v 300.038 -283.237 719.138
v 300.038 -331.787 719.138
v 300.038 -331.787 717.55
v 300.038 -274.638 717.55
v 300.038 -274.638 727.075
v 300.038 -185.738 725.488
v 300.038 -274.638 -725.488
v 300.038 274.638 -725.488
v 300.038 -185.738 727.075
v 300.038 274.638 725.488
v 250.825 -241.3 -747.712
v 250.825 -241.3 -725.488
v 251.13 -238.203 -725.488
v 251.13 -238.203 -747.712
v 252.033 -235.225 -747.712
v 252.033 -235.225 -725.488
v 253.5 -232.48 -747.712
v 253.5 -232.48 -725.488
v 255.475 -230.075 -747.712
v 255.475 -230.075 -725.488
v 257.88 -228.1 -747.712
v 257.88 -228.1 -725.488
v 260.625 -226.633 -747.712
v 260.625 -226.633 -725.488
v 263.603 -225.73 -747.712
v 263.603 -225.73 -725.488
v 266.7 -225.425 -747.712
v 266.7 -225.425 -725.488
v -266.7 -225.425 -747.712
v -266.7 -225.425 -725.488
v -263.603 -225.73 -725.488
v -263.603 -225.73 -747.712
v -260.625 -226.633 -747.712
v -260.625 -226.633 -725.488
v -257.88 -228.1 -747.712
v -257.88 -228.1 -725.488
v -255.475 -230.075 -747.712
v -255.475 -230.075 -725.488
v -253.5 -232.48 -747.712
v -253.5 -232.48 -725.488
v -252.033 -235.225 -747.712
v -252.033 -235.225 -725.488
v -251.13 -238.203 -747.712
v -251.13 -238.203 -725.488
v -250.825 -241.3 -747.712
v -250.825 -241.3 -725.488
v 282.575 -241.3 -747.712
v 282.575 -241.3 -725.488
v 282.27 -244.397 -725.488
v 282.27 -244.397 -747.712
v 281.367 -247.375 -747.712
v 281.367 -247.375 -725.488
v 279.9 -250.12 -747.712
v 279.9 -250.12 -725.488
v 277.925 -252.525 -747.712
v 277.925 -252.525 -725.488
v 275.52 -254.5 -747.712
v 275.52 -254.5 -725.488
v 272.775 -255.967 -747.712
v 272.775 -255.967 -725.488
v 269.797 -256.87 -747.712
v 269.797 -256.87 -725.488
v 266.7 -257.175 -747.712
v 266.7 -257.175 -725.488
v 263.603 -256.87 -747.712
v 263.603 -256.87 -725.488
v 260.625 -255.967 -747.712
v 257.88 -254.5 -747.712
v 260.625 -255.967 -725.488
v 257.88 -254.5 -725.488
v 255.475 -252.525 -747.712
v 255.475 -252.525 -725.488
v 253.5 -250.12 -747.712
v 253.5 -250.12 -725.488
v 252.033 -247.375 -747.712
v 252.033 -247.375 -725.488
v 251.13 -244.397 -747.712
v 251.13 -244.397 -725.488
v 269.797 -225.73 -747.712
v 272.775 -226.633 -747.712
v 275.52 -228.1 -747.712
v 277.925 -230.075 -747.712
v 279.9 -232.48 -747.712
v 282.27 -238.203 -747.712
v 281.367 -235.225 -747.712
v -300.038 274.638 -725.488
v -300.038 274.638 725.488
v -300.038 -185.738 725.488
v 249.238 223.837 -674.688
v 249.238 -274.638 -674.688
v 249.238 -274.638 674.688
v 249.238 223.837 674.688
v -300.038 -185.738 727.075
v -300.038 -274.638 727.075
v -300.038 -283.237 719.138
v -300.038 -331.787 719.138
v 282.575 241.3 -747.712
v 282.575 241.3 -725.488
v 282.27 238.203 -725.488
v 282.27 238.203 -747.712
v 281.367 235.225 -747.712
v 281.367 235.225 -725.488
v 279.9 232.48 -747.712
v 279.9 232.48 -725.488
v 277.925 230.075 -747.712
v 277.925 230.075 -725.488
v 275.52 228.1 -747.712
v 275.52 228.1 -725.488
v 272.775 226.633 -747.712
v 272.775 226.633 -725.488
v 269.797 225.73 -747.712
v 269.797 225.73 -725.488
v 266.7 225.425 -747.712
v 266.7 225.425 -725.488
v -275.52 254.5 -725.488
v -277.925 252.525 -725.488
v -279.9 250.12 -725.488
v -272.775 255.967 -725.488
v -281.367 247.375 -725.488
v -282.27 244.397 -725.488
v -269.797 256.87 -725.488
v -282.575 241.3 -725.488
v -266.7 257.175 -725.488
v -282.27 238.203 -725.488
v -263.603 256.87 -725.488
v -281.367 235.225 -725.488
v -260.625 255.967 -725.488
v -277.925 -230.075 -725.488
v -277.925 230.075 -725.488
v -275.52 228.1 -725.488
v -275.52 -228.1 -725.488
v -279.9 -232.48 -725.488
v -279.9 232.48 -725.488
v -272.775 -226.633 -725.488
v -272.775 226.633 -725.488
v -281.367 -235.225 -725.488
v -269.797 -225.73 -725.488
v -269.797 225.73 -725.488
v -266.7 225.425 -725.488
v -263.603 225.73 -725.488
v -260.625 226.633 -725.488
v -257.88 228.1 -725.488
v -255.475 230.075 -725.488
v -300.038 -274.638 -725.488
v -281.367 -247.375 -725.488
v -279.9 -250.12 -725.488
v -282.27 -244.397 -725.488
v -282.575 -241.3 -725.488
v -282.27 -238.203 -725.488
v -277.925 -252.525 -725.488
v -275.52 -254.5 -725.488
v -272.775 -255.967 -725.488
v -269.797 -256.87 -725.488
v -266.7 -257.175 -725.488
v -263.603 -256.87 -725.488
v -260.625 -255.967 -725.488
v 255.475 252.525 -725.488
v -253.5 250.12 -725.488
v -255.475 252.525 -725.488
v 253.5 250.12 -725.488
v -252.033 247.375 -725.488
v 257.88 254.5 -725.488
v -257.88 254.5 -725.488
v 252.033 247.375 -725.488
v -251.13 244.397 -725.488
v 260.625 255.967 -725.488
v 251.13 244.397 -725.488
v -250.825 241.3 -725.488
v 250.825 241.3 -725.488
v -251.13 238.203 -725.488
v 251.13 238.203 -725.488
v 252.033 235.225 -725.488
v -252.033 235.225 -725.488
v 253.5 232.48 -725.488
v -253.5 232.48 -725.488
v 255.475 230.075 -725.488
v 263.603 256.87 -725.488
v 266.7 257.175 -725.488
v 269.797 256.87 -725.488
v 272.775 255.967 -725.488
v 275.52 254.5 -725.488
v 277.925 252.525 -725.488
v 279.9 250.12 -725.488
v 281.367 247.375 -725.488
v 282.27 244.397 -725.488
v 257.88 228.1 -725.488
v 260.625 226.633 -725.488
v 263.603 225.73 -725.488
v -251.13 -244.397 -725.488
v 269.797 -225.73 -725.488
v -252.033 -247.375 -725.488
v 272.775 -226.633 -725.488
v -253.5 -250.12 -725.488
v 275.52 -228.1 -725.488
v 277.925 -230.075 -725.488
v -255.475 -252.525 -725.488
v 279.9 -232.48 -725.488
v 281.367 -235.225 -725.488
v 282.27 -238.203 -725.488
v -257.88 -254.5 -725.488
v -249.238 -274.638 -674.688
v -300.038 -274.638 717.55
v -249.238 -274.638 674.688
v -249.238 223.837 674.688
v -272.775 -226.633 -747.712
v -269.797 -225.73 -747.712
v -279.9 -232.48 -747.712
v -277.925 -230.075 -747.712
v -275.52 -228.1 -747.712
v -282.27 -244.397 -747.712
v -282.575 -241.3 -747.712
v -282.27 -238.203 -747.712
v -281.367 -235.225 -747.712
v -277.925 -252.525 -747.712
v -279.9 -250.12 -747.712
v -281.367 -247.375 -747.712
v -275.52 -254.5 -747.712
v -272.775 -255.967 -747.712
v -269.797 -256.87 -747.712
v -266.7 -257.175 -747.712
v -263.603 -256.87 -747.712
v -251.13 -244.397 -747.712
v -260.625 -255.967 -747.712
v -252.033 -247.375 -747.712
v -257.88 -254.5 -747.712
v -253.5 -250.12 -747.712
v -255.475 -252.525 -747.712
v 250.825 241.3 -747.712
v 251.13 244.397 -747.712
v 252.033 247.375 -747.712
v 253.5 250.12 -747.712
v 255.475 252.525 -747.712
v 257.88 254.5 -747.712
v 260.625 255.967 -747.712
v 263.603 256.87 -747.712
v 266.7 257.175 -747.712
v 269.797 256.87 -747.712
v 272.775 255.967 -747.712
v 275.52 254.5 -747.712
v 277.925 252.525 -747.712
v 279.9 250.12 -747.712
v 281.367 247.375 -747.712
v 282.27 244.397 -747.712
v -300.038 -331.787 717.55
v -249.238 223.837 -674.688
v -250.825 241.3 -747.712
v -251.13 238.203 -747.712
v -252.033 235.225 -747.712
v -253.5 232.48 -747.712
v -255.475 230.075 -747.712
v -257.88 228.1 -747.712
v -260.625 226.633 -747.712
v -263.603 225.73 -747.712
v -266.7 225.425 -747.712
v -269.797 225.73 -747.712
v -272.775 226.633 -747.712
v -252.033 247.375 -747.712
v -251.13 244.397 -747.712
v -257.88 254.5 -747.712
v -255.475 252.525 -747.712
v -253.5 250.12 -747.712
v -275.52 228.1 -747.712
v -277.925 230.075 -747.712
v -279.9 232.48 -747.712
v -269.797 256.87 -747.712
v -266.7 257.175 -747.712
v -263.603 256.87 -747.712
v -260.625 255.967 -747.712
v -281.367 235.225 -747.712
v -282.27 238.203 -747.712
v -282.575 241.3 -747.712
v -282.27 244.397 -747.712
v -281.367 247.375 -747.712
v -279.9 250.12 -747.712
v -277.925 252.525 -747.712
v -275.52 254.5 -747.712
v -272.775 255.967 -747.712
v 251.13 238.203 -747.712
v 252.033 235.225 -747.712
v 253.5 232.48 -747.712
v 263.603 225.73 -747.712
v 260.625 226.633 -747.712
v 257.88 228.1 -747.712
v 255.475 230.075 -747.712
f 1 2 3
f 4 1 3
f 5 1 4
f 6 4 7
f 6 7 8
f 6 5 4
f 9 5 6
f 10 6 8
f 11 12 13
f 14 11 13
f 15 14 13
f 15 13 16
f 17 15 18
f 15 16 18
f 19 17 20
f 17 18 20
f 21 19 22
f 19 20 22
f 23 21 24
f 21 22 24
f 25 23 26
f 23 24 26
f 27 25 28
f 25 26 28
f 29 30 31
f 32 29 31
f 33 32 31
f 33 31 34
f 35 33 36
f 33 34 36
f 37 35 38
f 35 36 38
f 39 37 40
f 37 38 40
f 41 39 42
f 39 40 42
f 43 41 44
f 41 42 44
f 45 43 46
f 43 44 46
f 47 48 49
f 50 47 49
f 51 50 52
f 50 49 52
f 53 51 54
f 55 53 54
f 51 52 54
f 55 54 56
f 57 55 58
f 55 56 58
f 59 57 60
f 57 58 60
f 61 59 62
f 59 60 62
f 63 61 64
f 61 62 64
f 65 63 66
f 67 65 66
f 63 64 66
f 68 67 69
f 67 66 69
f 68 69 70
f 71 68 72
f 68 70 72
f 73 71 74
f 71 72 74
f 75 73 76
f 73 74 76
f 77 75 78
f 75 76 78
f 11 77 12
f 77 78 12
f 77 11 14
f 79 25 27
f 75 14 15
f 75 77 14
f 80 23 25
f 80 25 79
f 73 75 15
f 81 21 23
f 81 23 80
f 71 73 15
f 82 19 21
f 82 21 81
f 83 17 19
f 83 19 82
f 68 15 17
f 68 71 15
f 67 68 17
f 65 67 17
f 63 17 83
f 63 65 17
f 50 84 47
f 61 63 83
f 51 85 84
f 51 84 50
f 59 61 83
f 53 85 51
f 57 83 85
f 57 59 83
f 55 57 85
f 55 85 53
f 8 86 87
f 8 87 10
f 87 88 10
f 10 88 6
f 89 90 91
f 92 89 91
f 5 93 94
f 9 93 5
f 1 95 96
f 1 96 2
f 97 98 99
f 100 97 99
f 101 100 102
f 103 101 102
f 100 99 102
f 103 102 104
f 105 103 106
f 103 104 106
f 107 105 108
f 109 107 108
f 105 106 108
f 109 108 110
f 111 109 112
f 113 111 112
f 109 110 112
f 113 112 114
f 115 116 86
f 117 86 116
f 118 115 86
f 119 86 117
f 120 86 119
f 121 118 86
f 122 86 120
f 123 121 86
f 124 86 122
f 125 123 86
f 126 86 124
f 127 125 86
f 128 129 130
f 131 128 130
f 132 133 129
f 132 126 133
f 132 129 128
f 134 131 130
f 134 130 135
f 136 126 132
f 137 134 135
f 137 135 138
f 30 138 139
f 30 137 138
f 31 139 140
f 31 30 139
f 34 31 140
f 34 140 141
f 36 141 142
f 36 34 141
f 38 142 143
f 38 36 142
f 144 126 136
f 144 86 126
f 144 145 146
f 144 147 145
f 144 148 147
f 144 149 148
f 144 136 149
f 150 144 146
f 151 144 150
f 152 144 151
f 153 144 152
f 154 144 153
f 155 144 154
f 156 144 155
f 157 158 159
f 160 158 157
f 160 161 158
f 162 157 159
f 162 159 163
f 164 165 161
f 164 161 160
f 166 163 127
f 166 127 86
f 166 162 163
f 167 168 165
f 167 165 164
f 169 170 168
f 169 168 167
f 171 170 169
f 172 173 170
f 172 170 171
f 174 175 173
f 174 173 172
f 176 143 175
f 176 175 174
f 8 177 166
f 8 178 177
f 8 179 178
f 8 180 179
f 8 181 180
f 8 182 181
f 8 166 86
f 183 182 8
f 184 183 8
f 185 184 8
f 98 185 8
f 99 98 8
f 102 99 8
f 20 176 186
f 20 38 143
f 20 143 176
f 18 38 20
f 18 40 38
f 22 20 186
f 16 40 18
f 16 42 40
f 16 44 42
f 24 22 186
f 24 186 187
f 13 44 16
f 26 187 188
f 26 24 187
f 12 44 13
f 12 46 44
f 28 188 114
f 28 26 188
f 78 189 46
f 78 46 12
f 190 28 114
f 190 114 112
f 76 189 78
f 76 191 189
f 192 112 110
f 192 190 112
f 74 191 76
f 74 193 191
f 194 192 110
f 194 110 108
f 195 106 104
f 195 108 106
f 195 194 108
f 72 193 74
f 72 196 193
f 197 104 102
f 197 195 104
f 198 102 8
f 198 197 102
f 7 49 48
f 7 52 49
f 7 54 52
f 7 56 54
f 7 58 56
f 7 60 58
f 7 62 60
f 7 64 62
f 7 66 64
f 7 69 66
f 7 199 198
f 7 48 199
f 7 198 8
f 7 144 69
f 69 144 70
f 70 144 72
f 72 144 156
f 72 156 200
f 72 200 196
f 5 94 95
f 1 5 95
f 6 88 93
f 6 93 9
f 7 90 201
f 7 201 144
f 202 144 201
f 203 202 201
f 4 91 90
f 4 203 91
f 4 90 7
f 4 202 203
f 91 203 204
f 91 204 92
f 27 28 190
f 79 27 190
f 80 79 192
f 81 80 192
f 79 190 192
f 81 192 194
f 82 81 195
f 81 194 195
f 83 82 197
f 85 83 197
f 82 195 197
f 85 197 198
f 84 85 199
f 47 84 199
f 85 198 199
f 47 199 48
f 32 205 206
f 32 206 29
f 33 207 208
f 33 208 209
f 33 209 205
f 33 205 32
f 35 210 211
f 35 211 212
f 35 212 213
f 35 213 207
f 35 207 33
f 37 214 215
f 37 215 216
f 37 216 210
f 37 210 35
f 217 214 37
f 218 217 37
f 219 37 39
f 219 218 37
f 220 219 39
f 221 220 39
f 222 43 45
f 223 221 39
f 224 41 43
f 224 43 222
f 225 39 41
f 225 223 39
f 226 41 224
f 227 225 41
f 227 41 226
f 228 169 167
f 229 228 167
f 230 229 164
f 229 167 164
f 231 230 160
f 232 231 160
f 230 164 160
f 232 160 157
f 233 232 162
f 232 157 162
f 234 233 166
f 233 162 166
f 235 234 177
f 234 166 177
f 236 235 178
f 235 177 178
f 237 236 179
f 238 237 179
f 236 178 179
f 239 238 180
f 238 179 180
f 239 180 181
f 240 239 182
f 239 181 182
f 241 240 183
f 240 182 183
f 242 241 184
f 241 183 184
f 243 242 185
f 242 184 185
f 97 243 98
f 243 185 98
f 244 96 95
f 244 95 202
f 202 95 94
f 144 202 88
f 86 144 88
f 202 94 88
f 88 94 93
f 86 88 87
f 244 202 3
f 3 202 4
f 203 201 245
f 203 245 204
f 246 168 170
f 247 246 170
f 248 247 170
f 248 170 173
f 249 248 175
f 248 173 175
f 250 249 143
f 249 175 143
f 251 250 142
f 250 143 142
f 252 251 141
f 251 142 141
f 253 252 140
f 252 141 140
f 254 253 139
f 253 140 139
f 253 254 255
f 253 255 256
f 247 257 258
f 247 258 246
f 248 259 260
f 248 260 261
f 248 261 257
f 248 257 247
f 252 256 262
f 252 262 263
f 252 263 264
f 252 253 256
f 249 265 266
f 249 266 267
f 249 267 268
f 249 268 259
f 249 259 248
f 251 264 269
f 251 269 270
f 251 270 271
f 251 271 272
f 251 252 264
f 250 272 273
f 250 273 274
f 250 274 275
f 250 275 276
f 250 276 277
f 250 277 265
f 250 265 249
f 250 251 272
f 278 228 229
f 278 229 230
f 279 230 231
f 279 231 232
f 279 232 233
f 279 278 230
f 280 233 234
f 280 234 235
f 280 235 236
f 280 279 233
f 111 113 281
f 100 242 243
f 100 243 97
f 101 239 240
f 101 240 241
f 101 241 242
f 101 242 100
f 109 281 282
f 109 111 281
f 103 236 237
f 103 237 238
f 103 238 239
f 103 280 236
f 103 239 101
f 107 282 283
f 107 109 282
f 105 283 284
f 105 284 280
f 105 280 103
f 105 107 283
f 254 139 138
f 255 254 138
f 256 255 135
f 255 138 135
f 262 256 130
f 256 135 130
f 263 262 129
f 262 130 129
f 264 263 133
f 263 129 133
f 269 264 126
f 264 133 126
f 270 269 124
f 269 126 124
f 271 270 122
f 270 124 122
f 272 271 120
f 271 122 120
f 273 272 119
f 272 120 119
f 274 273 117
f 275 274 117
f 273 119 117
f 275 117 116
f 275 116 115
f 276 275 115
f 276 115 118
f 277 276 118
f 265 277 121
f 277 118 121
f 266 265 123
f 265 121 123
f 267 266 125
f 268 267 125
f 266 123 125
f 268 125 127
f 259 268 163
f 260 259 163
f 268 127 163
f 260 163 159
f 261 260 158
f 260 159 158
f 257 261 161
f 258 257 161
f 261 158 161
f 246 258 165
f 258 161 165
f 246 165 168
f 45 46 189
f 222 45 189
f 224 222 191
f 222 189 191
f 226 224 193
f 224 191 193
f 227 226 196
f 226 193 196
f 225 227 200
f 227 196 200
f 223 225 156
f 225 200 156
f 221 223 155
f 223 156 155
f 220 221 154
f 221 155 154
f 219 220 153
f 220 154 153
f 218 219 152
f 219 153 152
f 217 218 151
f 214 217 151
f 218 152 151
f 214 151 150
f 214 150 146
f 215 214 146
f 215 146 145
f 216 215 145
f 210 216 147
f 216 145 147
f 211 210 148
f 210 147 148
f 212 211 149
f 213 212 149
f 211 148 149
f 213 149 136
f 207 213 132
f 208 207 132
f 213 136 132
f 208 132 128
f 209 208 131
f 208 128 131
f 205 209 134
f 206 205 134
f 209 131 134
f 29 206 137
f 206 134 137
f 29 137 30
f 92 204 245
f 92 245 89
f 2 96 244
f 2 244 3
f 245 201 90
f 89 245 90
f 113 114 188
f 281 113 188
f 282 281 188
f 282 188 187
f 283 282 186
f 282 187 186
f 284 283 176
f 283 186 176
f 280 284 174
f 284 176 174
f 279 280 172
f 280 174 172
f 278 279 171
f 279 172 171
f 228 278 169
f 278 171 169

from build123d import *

# Parameters (mm, degrees)
F0_W      = 600.075
F0_H      = 1450.975
F1_DEPTH  = 274.6375
F2_T      = -50.8
F4_DEPTH  = 22.225
F5_W      = 600.075
F5_H      = 1.5875
F6_DEPTH  = 57.15
F7_W      = 600.075
F7_H      = 88.9
F8_DEPTH  = 1.5875
F10_DEPTH = 600.075


with BuildPart() as f1:
    # F0 (on Front) → F1 (new body, symmetric)
    with BuildSketch(Plane.XZ):
        Rectangle(F0_W, F0_H)
    extrude(amount=F1_DEPTH, both=True)

    # F2
    f2_openings = [f1.faces().sort_by_distance(p)[0] for p in [
        (0, -274.6375, 0),
    ]]
    offset(amount=F2_T, openings=f2_openings)

    # F3 (on face) → F4 (join)
    with BuildSketch(Plane(origin=(0, 0, -725.4875), x_dir=(1, 0, 0), z_dir=(0, 0, -1))):
        with BuildLine():
            ThreePointArc((-250.825, 241.3), (-277.92532, 252.52532), (-266.7, 225.425))
            Line((-266.7, 225.425), (-266.7, 241.3))
            Line((-266.7, 241.3), (-250.825, 241.3))
        make_face()
        with BuildLine():
            Line((-266.7, 241.3), (-266.7, 225.425))
            ThreePointArc((-266.7, 225.425), (-255.47468, 230.07468), (-250.825, 241.3))
            Line((-250.825, 241.3), (-266.7, 241.3))
        make_face()
        with BuildLine():
            ThreePointArc((250.825, 241.3), (255.47468, 230.07468), (266.7, 225.425))
            Line((266.7, 225.425), (266.7, 241.3))
            Line((266.7, 241.3), (250.825, 241.3))
        make_face()
        with BuildLine():
            Line((266.7, 241.3), (266.7, 225.425))
            ThreePointArc((266.7, 225.425), (277.92532, 230.07468), (282.575, 241.3))
            ThreePointArc((282.575, 241.3), (266.7, 257.175), (250.825, 241.3))
            Line((250.825, 241.3), (266.7, 241.3))
        make_face()
        with BuildLine():
            ThreePointArc((266.7, -225.425), (255.47468, -230.07468), (250.825, -241.3))
            Line((250.825, -241.3), (266.7, -241.3))
            Line((266.7, -241.3), (266.7, -225.425))
        make_face()
        with BuildLine():
            Line((266.7, -241.3), (250.825, -241.3))
            ThreePointArc((250.825, -241.3), (266.7, -257.175), (282.575, -241.3))
            ThreePointArc((282.575, -241.3), (277.92532, -230.07468), (266.7, -225.425))
            Line((266.7, -225.425), (266.7, -241.3))
        make_face()
        with BuildLine():
            Line((-266.7, -241.3), (-250.825, -241.3))
            ThreePointArc((-250.825, -241.3), (-255.47468, -230.07468), (-266.7, -225.425))
            Line((-266.7, -225.425), (-266.7, -241.3))
        make_face()
        with BuildLine():
            ThreePointArc((-266.7, -225.425), (-277.92532, -252.52532), (-250.825, -241.3))
            Line((-250.825, -241.3), (-266.7, -241.3))
            Line((-266.7, -241.3), (-266.7, -225.425))
        make_face()
    extrude(amount=F4_DEPTH)

    # F5 (on face) → F6 (join)
    with BuildSketch(Plane.XZ.offset(274.6375)):
        with Locations((0, 718.34375)):
            Rectangle(F5_W, F5_H)
    extrude(amount=F6_DEPTH)

    # F7 (on face) → F8 (join)
    with BuildSketch(Plane.XY.offset(725.4875)):
        with Locations((0, -230.1875)):
            Rectangle(F7_W, F7_H)
    extrude(amount=F8_DEPTH)

    # F9 (on face) → F10 (join)
    with BuildSketch(Plane.YZ.offset(300.0375)):
        Polygon((-274.6375, 719.1375), (-274.6375, 727.075), (-283.236563, 719.1375), align=None)
    extrude(amount=-F10_DEPTH)


solid = f1.part
